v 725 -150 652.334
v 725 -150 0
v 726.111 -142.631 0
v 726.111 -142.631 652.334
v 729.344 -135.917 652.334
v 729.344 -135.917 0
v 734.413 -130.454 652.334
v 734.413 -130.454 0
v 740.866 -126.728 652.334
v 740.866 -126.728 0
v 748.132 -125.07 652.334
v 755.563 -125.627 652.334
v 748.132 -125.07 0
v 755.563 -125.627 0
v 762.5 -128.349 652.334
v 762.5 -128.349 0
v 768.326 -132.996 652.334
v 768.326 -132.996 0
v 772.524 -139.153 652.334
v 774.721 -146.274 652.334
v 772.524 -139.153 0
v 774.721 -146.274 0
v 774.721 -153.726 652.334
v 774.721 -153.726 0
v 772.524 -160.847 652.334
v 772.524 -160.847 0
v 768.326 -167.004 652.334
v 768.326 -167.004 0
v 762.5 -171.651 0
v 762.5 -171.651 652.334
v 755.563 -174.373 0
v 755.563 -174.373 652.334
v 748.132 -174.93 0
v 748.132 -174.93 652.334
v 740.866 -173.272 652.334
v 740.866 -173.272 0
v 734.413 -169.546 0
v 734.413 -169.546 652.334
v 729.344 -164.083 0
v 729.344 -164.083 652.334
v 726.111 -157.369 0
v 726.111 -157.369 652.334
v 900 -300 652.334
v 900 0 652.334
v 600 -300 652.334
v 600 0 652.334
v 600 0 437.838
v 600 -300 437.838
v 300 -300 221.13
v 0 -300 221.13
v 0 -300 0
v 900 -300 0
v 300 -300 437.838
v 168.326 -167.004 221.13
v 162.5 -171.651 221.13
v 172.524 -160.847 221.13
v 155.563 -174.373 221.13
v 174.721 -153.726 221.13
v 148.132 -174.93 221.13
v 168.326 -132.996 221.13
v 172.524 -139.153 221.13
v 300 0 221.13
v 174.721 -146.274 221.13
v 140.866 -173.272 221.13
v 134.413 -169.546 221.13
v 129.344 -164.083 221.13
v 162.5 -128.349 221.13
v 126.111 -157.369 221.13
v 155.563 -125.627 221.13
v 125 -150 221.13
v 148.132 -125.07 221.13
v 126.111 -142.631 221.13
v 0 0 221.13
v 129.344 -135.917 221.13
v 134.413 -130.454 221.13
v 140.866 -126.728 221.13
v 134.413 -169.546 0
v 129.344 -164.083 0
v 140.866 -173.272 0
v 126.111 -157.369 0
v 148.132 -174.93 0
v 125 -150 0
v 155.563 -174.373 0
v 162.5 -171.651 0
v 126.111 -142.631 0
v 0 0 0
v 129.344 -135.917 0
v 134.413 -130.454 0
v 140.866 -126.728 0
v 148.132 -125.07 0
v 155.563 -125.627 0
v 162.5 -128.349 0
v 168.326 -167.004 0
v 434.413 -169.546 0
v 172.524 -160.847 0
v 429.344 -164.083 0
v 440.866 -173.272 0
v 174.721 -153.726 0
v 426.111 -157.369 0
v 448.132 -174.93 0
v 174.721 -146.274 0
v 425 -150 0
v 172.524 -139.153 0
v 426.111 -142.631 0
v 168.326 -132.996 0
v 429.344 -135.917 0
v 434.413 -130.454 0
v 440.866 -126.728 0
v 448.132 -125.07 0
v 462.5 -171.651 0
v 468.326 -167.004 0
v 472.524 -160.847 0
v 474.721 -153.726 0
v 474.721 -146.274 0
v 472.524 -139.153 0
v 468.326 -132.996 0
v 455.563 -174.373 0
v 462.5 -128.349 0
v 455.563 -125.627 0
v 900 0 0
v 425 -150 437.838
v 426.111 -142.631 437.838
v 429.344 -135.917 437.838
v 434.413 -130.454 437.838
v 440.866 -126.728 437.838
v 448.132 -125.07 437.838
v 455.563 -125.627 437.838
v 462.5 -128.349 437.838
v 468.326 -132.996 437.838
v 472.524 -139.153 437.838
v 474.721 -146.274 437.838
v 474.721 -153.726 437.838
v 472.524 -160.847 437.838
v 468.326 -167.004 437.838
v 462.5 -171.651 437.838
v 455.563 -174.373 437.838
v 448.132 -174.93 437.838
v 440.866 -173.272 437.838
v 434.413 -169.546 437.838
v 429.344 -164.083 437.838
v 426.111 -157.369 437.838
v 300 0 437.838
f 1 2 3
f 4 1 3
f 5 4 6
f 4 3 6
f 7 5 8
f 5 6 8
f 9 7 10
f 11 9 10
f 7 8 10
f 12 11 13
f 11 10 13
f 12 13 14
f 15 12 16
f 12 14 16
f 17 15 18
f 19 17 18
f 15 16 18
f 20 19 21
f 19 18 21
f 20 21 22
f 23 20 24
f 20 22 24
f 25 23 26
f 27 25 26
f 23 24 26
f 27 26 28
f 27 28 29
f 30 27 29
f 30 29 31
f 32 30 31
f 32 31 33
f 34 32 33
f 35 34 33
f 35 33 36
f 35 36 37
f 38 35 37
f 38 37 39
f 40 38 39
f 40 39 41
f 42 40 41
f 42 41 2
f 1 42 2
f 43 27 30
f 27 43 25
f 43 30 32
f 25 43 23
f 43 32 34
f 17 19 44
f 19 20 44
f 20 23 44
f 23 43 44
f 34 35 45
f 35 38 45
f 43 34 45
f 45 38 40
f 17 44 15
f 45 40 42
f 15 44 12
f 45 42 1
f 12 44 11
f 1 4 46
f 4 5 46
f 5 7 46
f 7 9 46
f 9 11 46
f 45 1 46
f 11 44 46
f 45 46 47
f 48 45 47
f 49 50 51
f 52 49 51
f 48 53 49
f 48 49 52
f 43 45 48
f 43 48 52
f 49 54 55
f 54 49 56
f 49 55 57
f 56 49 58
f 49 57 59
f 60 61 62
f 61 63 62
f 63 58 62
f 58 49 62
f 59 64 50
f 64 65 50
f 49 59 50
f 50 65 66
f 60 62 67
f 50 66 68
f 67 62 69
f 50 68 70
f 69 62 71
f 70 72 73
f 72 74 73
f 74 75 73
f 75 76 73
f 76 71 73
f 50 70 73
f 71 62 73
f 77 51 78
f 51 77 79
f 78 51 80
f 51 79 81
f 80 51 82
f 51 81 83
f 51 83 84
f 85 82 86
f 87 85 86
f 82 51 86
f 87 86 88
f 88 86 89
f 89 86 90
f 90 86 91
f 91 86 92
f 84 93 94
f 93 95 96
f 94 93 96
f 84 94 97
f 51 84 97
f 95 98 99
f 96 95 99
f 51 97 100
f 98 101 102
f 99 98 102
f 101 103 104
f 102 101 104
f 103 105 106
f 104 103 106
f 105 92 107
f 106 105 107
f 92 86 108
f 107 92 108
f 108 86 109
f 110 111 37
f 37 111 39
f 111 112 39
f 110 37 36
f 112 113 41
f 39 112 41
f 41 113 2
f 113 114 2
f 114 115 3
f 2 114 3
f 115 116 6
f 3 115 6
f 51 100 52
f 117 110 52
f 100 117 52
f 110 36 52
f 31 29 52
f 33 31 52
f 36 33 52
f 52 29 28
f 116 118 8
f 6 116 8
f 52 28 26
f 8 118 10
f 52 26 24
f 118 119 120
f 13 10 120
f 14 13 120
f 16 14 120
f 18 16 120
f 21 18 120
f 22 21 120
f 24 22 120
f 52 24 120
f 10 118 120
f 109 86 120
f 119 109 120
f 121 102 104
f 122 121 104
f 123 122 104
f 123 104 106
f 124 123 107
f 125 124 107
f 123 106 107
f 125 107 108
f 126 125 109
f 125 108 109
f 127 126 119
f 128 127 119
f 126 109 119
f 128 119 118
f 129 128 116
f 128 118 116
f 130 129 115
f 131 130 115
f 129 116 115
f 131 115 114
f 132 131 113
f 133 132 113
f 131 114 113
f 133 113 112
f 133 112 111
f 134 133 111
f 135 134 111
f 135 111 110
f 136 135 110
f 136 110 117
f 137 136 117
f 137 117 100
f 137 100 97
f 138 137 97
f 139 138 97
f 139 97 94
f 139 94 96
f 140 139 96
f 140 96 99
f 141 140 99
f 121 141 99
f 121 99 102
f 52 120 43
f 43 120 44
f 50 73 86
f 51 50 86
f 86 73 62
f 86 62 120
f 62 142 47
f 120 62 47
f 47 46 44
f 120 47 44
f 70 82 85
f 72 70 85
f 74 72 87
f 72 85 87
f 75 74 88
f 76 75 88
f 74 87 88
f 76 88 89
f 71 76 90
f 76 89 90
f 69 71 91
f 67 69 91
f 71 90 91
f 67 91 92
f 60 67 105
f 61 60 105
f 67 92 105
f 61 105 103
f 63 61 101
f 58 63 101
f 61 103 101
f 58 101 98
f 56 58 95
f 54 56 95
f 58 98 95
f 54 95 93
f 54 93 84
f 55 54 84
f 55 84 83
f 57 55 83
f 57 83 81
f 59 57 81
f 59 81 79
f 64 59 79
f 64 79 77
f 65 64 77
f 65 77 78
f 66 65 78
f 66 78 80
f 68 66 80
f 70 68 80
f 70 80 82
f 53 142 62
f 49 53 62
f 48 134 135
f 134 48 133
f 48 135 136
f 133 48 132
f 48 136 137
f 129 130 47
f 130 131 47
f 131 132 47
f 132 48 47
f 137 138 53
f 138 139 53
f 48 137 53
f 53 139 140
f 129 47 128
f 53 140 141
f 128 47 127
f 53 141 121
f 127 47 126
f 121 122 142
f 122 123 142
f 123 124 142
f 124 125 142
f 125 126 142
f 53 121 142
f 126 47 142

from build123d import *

# Parameters (mm, degrees)
F1_DEPTH = 300
F3_D     = 50
F5_D     = 50
F7_D     = 50


with BuildPart() as f1:
    # F0 (on Front) → F1 (new body)
    with BuildSketch(Plane.XZ):
        Polygon((0, 221.130219), (0, 0), (900, 0), (900, 652.334173), (600, 652.334173), (600, 437.837817), (300, 437.837817), (300, 221.130219), align=None)
    extrude(amount=F1_DEPTH)

    # F3 (through all)
    with Locations(Plane.XY.offset(437.837817)):
        with Locations((450, -150)):
            Hole(F3_D / 2)

    # F5 (through all)
    with Locations(Plane.XY.offset(221.130219)):
        with Locations((150, -150)):
            Hole(F5_D / 2)

    # F7 (through all)
    with Locations(Plane.XY.offset(652.334173)):
        with Locations((750, -150)):
            Hole(F7_D / 2)


solid = f1.part
